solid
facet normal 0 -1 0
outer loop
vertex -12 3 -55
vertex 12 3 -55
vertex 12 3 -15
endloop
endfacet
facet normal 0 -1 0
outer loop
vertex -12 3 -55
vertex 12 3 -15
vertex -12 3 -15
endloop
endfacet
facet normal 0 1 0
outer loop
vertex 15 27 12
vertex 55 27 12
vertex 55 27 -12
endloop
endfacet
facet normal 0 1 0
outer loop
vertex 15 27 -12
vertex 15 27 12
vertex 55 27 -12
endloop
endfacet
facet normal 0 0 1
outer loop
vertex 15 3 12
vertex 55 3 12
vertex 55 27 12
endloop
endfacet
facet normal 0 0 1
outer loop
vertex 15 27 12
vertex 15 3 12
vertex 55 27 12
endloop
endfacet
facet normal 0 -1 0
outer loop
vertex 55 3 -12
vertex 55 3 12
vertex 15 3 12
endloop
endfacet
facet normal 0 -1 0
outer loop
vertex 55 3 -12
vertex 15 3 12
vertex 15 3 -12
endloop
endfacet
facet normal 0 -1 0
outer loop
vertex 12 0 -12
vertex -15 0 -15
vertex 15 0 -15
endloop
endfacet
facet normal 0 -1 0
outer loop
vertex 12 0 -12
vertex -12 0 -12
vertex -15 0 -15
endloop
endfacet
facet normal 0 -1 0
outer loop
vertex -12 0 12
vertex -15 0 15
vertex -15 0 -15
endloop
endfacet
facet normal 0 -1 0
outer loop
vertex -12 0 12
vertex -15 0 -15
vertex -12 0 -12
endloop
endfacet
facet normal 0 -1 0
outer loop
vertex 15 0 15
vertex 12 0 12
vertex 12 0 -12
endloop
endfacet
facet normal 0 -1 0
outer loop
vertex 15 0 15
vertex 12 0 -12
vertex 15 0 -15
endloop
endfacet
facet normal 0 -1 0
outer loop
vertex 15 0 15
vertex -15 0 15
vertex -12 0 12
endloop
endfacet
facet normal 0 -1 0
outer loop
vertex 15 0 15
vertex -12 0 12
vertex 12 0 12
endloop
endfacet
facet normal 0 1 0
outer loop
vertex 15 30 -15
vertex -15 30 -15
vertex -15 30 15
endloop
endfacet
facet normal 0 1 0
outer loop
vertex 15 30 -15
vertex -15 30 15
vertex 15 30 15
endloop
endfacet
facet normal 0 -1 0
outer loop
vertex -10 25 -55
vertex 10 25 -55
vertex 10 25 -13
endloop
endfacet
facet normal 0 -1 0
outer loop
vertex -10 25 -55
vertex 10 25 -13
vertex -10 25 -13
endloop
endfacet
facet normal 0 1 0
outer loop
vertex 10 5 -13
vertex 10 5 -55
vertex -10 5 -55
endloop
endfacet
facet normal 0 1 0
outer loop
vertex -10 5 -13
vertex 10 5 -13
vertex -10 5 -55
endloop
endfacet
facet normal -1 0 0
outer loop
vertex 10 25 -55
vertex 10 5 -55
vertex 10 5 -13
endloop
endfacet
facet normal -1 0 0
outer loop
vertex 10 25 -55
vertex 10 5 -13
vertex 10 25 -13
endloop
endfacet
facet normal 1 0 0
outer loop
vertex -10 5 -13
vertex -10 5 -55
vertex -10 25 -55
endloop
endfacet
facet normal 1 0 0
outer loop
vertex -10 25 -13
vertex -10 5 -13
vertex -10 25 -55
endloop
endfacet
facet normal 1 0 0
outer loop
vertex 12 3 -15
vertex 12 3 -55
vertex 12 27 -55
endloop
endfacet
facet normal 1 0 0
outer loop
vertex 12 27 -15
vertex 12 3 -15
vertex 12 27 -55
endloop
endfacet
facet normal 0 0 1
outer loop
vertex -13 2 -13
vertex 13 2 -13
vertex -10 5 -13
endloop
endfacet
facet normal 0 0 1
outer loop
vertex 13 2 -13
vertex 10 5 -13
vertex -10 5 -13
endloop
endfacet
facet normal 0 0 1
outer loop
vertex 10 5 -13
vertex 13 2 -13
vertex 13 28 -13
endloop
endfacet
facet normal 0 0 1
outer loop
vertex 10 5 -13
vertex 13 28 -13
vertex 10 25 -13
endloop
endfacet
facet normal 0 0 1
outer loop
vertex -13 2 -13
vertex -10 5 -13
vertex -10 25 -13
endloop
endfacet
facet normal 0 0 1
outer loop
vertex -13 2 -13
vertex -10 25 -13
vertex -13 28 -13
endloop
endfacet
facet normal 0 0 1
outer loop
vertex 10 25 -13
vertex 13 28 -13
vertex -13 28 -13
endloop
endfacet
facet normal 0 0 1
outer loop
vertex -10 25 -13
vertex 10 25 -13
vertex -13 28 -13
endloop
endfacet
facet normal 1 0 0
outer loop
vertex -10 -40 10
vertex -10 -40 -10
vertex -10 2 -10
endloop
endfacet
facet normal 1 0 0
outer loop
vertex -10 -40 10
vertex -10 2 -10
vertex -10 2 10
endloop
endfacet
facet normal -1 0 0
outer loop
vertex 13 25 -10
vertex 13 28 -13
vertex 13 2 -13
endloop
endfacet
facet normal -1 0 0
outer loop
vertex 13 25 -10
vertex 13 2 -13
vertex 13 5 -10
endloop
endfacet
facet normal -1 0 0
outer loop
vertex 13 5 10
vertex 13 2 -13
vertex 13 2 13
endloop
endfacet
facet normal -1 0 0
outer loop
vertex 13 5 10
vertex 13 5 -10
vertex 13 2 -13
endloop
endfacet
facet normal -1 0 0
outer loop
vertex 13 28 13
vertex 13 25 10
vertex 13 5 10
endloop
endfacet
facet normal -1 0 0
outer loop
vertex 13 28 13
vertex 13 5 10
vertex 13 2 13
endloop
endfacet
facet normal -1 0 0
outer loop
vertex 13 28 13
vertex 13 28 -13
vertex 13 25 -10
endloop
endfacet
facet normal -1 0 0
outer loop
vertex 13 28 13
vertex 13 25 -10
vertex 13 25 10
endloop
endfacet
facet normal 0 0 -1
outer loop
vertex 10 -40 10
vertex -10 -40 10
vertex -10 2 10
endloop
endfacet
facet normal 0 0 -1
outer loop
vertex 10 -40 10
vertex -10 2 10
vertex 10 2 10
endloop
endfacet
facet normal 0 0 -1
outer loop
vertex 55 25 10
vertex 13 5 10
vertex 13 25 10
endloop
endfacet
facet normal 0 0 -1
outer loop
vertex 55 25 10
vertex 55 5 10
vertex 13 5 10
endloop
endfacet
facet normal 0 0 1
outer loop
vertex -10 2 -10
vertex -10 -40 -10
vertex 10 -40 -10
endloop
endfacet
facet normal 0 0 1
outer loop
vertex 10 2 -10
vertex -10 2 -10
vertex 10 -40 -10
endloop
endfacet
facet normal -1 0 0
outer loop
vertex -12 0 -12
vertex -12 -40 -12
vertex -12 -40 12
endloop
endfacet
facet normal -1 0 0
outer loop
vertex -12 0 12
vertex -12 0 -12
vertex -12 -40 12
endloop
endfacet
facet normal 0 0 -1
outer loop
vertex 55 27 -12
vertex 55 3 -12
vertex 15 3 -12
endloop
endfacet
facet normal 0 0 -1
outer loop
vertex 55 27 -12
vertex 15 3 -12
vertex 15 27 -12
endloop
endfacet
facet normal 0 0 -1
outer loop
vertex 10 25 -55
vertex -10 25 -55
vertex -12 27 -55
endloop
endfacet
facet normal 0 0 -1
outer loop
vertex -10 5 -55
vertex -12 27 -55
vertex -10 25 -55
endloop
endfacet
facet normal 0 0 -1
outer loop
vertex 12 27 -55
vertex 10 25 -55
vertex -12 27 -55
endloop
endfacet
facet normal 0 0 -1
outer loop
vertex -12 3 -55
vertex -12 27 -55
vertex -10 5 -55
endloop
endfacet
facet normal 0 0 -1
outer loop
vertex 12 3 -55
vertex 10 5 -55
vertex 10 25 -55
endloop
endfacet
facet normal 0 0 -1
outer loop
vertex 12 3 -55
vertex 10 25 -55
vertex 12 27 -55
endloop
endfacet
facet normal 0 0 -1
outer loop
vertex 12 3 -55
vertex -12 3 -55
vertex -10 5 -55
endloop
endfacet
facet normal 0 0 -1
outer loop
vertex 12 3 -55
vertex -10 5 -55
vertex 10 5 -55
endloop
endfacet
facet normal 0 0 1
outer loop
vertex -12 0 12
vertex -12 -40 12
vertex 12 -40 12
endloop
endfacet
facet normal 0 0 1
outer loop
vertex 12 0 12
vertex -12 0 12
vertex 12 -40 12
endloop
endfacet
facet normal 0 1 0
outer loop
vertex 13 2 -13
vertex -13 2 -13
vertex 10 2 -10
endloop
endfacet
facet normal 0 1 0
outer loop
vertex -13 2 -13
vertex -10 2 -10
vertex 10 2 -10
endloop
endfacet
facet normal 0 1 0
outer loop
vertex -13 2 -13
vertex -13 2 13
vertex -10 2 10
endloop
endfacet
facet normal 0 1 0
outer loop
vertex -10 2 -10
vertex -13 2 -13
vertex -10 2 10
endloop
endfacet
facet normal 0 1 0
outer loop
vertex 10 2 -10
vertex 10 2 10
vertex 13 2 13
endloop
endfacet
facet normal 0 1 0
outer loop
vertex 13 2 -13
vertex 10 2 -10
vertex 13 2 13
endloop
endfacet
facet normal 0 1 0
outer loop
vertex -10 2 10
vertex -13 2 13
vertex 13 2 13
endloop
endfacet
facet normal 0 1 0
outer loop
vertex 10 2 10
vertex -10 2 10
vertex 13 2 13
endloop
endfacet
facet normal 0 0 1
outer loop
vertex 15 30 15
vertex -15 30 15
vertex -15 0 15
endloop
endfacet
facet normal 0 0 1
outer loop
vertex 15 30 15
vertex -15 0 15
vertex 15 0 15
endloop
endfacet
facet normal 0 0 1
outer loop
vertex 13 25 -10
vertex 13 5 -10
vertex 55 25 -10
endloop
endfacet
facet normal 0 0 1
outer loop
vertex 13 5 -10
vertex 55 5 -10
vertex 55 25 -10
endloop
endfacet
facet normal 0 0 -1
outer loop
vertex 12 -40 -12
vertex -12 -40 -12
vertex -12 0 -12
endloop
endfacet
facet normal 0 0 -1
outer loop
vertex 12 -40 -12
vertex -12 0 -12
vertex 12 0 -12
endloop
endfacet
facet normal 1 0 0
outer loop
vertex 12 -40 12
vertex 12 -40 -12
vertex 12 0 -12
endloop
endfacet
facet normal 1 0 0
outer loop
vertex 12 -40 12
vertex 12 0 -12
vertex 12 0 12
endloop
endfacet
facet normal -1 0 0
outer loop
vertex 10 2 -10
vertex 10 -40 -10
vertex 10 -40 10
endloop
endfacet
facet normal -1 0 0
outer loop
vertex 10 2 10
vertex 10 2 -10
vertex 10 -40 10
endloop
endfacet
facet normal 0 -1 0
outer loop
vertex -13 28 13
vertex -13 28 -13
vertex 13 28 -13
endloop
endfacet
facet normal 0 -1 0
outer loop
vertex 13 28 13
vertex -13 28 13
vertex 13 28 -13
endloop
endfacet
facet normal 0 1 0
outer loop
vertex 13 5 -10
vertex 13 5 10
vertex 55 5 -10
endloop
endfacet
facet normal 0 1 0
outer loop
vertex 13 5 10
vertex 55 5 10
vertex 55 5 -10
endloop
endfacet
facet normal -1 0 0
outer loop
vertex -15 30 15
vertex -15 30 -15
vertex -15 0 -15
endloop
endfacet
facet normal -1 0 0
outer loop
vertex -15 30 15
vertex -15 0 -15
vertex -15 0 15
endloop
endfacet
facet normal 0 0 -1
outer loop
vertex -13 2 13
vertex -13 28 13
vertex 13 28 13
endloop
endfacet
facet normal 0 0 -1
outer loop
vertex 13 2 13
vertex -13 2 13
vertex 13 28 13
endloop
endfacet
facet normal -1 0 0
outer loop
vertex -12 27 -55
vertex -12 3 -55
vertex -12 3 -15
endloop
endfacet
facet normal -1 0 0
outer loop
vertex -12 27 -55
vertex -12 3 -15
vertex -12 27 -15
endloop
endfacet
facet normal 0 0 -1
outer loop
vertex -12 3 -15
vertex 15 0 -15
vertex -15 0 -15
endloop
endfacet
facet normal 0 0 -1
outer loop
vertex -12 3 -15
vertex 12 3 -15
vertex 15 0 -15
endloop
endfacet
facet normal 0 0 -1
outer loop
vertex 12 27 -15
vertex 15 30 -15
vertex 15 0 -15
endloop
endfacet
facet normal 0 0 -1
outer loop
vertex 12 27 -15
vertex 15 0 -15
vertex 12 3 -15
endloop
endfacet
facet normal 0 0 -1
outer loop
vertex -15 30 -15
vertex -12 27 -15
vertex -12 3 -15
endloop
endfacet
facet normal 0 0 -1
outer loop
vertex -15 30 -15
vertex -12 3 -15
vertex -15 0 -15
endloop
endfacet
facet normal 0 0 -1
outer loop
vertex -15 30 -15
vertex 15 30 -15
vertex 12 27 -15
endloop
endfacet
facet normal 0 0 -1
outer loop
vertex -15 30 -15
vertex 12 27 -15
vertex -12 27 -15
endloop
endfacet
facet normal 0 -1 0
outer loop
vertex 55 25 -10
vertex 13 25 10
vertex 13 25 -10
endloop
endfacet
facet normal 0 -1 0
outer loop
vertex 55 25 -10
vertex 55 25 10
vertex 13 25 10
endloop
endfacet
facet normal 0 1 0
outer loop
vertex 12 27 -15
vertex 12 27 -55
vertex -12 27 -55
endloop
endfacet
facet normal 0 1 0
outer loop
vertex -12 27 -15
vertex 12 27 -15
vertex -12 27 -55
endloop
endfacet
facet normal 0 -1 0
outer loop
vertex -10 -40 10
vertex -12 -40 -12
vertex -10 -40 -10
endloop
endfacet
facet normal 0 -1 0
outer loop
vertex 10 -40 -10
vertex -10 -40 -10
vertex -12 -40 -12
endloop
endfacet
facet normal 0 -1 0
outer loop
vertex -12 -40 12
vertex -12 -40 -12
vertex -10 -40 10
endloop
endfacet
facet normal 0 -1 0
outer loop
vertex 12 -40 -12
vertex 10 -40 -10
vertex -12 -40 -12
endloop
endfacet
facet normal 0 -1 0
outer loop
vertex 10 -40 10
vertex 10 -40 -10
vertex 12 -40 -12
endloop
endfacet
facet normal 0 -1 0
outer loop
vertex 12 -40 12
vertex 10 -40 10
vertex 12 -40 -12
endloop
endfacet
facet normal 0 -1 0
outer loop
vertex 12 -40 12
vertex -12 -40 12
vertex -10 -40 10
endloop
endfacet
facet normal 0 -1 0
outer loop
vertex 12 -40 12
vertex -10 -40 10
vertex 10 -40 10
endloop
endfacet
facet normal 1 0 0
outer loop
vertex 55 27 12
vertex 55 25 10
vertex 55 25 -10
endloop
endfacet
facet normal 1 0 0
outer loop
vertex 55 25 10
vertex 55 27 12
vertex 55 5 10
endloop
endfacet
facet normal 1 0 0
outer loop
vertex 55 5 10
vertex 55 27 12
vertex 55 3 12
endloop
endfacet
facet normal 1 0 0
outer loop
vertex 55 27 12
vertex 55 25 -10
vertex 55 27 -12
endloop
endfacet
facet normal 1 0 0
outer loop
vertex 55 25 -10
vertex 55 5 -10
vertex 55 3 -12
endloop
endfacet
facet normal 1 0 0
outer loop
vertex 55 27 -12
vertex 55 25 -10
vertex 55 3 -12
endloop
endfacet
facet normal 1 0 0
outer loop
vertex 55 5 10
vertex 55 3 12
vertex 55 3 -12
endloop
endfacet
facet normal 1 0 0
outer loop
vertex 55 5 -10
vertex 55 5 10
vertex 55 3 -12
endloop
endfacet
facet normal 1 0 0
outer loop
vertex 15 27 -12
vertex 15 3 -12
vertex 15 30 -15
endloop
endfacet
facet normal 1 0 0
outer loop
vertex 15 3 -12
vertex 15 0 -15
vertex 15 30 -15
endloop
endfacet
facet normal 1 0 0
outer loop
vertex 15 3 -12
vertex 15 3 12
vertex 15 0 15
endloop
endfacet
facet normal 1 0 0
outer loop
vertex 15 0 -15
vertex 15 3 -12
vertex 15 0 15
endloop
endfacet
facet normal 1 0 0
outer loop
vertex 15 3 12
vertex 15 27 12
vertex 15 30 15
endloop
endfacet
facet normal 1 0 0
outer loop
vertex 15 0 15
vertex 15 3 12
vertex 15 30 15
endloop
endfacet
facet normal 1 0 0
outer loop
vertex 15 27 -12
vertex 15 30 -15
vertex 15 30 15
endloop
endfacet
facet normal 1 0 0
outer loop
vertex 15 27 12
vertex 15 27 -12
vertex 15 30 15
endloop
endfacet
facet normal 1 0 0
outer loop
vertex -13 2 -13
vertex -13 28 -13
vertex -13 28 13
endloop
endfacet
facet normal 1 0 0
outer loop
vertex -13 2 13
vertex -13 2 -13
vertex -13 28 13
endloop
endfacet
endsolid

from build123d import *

# Parameters (mm, degrees)
CROQUIS1_W     = 30
CROQUIS1_H     = 40
CROQUIS1_H_2   = 30
CROQUIS1_W_2   = 40
EXTRUIR1_DEPTH = 30
CROQUIS5_W     = 30
CROQUIS5_H     = 30
EXTRUIR4_DEPTH = 40
CROQUIS2_W     = 30
CROQUIS2_H     = 30
CROQUIS2_W_2   = 24
CROQUIS2_H_2   = 24
EXTRUIR2_DEPTH = 40
CROQUIS3_W     = 30
CROQUIS3_H     = 30
CROQUIS3_W_2   = 24
CROQUIS3_H_2   = 24
EXTRUIR3_DEPTH = 40
CROQUIS7_W     = 30
CROQUIS7_H     = 30
CROQUIS7_W_2   = 24
CROQUIS7_H_2   = 24
EXTRUIR5_DEPTH = 40
VACIADO1_T     = -2


with BuildPart() as part:
    # Croquis1 → Extruir1 (new body)
    with BuildSketch(Plane(origin=(0, 0, 0), x_dir=(1, 0, 0), z_dir=(0, 1, 0))):
        with Locations((0, 35)):
            Rectangle(CROQUIS1_W, CROQUIS1_H)
        Rectangle(CROQUIS1_W, CROQUIS1_H_2)
        with Locations((35, 0)):
            Rectangle(CROQUIS1_W_2, CROQUIS1_H_2)
    extrude(amount=EXTRUIR1_DEPTH)

    # Croquis5 → Extruir4 (add)
    with BuildSketch(Plane.XZ):
        Rectangle(CROQUIS5_W, CROQUIS5_H)
    extrude(amount=EXTRUIR4_DEPTH)

    # Croquis2 → Extruir2 (cut)
    with BuildSketch(Plane(origin=(55, 0, 0), x_dir=(0, 0, -1), z_dir=(1, 0, 0))):
        with Locations((0, 15)):
            Rectangle(CROQUIS2_W, CROQUIS2_H)
        with Locations((0, 15)):
            Rectangle(CROQUIS2_W_2, CROQUIS2_H_2, mode=Mode.SUBTRACT)
    extrude(amount=-EXTRUIR2_DEPTH, mode=Mode.SUBTRACT)

    # Croquis3 → Extruir3 (cut)
    with BuildSketch(Plane(origin=(0, 0, -55), x_dir=(-1, 0, 0), z_dir=(0, 0, -1))):
        with Locations((0, 15)):
            Rectangle(CROQUIS3_W, CROQUIS3_H)
        with Locations((0, 15)):
            Rectangle(CROQUIS3_W_2, CROQUIS3_H_2, mode=Mode.SUBTRACT)
    extrude(amount=-EXTRUIR3_DEPTH, mode=Mode.SUBTRACT)

    # Croquis7 → Extruir5 (cut)
    with BuildSketch(Plane.XZ.offset(40)):
        Rectangle(CROQUIS7_W, CROQUIS7_H)
        Rectangle(CROQUIS7_W_2, CROQUIS7_H_2, mode=Mode.SUBTRACT)
    extrude(amount=-EXTRUIR5_DEPTH, mode=Mode.SUBTRACT)

    # Vaciado1
    vaciado1_openings = [part.faces().sort_by_distance(p)[0] for p in [
        (55, 15, 0),
        (0, 15, -55),
        (0, -40, 0),
    ]]
    offset(amount=VACIADO1_T, openings=vaciado1_openings, kind=Kind.INTERSECTION)


solid = part.part
